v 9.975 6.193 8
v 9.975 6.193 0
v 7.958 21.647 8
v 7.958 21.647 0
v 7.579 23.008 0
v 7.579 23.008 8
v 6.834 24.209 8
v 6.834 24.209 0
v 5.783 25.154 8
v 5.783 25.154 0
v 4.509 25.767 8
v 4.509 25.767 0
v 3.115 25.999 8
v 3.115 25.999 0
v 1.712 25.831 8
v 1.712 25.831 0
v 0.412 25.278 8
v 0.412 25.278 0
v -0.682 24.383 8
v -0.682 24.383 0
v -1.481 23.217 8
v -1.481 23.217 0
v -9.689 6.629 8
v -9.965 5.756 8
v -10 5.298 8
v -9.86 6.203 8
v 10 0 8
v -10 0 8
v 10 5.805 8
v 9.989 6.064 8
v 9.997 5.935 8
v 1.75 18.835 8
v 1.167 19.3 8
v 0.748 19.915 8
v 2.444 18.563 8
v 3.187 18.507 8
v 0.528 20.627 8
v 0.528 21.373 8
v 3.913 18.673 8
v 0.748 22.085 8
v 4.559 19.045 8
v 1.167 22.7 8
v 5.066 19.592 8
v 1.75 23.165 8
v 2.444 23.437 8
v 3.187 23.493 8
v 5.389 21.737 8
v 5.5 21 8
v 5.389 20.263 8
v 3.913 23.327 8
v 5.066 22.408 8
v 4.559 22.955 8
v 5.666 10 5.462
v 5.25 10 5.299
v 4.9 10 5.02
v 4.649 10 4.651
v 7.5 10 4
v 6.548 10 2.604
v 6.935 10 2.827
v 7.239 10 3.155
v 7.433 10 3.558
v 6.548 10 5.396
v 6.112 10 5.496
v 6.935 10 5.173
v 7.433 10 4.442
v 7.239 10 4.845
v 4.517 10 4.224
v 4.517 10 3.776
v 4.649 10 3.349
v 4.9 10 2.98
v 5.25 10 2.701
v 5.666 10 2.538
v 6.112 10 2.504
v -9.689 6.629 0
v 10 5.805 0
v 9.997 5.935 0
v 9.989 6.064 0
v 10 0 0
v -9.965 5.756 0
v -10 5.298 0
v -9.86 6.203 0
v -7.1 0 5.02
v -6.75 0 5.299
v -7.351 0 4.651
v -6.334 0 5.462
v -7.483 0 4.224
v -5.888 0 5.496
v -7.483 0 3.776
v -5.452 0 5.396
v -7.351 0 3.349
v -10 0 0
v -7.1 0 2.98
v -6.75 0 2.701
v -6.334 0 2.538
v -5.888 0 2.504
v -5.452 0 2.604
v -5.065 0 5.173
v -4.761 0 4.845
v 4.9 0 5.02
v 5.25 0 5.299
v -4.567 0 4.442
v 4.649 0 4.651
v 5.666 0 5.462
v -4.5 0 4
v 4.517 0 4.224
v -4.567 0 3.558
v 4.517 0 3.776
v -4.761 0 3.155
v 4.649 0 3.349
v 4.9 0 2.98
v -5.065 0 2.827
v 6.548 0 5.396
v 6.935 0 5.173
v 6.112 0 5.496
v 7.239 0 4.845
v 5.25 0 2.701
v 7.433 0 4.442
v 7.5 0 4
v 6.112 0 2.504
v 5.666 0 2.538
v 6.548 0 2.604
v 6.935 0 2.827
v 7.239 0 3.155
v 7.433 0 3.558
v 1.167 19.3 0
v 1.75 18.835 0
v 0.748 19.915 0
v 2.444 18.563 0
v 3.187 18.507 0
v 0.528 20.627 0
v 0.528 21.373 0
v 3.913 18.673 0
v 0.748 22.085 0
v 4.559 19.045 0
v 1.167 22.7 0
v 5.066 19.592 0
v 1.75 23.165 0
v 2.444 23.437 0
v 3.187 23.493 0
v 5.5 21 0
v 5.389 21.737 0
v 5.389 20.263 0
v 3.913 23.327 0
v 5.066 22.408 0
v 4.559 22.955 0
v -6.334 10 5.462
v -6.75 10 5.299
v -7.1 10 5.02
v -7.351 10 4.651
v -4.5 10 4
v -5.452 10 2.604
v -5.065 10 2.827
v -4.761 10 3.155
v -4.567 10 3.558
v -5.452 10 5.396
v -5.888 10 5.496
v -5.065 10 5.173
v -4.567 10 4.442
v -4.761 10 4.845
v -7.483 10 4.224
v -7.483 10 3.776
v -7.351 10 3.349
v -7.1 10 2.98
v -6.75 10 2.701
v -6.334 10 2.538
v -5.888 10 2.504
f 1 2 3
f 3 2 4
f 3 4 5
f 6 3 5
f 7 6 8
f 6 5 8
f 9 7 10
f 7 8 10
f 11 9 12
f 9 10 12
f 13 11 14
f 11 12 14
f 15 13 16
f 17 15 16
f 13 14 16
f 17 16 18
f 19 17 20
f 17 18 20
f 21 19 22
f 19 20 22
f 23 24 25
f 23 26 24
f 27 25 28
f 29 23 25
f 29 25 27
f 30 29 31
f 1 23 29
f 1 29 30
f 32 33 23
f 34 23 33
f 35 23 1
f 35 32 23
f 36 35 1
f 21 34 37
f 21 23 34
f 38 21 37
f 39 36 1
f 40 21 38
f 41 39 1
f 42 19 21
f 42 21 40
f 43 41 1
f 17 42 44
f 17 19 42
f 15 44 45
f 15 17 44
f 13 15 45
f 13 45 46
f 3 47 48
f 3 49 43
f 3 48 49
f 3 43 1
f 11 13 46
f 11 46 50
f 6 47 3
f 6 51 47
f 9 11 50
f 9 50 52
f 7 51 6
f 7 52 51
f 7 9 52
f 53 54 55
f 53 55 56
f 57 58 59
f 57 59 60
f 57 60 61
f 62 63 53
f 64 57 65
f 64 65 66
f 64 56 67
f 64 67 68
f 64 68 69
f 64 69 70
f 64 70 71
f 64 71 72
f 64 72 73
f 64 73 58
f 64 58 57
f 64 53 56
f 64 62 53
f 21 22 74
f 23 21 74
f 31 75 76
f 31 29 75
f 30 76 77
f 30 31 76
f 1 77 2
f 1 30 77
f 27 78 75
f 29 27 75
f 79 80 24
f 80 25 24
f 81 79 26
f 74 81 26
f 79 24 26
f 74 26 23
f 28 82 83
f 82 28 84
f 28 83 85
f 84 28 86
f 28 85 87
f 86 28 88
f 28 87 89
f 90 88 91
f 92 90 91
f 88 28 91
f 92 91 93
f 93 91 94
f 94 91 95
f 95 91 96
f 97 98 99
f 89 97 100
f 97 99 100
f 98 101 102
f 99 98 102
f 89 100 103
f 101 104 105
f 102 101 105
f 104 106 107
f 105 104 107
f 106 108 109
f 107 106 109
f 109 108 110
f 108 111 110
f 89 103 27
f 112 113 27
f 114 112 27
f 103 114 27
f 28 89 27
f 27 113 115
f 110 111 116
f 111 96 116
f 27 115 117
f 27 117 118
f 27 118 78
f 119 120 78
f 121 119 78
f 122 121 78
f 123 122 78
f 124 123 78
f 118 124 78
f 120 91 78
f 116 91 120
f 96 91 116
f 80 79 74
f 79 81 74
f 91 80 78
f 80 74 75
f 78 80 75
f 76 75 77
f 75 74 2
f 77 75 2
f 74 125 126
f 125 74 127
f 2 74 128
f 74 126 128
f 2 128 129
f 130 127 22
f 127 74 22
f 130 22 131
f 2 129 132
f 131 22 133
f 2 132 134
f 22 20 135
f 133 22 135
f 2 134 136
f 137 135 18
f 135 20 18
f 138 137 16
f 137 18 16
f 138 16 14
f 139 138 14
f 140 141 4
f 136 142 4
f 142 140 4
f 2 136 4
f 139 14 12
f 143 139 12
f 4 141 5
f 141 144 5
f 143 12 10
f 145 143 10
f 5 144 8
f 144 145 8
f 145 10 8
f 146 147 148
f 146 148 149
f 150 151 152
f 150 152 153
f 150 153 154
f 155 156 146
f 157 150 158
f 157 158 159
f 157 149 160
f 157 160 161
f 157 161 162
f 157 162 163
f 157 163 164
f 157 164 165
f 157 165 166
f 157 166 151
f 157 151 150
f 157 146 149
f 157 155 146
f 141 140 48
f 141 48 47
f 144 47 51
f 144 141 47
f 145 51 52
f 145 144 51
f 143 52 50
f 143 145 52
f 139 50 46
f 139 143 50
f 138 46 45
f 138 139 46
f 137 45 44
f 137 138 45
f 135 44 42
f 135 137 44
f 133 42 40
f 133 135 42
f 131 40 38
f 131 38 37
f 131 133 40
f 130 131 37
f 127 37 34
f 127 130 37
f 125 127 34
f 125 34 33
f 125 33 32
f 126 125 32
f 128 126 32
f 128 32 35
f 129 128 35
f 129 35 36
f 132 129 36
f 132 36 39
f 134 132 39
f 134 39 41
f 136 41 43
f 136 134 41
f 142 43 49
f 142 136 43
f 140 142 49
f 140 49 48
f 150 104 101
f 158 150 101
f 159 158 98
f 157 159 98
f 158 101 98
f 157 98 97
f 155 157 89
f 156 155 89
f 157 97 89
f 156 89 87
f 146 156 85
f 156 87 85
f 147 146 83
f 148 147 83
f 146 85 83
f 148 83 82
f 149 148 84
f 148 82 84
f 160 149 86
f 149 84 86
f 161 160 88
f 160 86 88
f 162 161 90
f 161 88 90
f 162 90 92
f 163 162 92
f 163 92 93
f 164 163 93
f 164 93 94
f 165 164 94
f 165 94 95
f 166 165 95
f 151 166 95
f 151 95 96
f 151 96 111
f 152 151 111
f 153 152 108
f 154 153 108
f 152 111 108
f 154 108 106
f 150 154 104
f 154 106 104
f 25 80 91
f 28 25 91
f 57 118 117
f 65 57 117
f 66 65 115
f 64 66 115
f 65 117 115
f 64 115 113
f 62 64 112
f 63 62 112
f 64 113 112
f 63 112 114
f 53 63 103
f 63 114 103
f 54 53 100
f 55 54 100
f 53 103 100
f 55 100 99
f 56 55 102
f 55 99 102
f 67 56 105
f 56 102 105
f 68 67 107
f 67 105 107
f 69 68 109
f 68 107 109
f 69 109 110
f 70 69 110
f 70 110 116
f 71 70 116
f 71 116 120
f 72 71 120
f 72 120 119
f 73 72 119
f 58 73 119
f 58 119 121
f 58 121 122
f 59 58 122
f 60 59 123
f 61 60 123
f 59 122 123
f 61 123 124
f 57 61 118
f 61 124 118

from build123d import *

# Parameters (mm, degrees)
SKETCH_1_R          = 2.5
EXTRUDE_1_DEPTH     = 8
SKETCH_2_R          = 1.5
CUT_EXTRUDE_1_DEPTH = 10
FILLET_1_R          = 3


with BuildPart() as part:
    # 草图1 → 凸台-拉伸1 (new body)
    with BuildSketch(Plane.XY):
        with BuildLine():
            Line((-10, 0), (10, 0))
            Line((10, 0), (10, 6))
            Line((10, 6), (7.957956343, 21.647046293))
            ThreePointArc((7.957956343, 21.647046293), (3.820468041, 25.932223859), (-1.481479577, 23.2172823))
            Line((-1.481479577, 23.2172823), (-10, 6))
            Line((-10, 6), (-10, 0))
        make_face()
        with Locations((3, 21)):
            Circle(SKETCH_1_R, mode=Mode.SUBTRACT)
    extrude(amount=EXTRUDE_1_DEPTH)

    # 草图2 → 切除-拉伸1 (cut)
    with BuildSketch(Plane.XZ):
        with Locations((-6, 4)):
            Circle(SKETCH_2_R)
        with Locations((6, 4)):
            Circle(SKETCH_2_R)
    extrude(amount=-CUT_EXTRUDE_1_DEPTH, mode=Mode.SUBTRACT)

    # 圆角1
    fillet_1_edges = [part.edges().sort_by_distance(p)[0] for p in [
        (-10, 6, 4),
        (10, 6, 4),
    ]]
    fillet(fillet_1_edges, radius=FILLET_1_R)


solid = part.part
